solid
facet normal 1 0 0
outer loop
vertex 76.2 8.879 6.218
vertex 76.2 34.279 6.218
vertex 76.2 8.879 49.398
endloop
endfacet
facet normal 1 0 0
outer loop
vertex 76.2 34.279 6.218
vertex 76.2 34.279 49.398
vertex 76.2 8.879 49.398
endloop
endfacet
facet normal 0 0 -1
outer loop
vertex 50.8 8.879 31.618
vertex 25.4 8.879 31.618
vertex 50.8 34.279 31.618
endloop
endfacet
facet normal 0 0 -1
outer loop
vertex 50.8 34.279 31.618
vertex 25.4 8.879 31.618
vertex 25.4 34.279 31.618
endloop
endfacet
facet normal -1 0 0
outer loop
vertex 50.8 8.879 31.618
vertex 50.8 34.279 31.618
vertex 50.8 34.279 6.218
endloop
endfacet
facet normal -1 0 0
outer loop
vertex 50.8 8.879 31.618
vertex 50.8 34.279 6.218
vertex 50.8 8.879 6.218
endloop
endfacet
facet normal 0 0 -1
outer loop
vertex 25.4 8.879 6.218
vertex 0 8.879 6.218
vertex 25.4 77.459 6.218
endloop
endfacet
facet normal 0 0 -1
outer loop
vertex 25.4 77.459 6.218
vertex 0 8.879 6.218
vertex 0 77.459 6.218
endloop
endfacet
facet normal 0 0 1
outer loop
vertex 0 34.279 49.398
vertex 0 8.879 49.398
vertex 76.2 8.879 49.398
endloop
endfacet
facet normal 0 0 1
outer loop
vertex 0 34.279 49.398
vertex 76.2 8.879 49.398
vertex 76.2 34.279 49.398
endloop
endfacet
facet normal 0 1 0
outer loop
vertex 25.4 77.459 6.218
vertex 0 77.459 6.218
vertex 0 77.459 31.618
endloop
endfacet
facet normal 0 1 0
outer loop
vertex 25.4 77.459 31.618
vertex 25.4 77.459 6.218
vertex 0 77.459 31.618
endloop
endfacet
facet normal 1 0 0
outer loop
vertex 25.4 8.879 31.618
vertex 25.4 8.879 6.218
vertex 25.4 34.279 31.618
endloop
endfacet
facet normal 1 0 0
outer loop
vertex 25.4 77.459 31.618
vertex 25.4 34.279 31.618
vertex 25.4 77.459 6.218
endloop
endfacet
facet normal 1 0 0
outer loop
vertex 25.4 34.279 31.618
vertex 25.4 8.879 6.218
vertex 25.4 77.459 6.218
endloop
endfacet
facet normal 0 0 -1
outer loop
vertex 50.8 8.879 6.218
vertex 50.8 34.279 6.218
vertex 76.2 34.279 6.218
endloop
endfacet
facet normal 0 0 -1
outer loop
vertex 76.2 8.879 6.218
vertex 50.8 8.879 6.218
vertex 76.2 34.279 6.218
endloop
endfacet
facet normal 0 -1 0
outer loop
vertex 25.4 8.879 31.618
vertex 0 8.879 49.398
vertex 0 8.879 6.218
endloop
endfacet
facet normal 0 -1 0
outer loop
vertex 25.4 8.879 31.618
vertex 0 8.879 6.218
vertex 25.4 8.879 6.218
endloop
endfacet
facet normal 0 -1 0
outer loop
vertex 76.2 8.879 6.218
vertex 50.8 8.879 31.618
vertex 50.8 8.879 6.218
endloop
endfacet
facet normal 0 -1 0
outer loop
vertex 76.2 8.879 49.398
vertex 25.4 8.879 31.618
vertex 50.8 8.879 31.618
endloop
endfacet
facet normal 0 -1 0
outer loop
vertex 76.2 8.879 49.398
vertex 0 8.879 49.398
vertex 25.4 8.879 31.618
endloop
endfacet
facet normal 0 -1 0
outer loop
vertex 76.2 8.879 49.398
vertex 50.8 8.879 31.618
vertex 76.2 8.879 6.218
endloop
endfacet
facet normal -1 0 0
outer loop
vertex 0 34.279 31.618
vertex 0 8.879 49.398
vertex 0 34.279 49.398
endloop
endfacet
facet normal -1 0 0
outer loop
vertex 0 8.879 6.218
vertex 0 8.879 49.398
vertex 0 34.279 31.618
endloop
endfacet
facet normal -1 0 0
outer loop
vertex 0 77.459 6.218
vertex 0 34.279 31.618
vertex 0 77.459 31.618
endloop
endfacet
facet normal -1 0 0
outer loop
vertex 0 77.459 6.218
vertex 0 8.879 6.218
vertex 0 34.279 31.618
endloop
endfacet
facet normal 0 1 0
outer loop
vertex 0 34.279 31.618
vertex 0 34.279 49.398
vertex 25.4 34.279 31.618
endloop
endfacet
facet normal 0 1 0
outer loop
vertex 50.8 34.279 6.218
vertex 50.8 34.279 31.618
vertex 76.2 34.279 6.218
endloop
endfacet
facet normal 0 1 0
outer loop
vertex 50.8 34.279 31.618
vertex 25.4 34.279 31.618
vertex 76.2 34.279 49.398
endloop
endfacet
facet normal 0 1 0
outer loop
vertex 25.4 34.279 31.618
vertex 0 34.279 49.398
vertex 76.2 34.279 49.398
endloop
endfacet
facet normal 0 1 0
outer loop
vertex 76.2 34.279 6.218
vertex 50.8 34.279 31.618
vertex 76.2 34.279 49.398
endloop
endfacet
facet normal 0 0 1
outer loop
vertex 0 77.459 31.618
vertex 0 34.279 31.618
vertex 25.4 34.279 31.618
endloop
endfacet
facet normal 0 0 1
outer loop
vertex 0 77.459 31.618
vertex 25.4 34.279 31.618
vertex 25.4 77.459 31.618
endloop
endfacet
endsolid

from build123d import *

# Parameters (mm, degrees)
F0_W     = 68.58
F0_H     = 25.4
F1_DEPTH = 25.4
F2_W     = 25.4
F2_H     = 25.4
F3_DEPTH = 17.78
F4_W     = 25.4
F4_H     = 17.78
F5_DEPTH = 50.8
F6_W     = 25.4
F6_H     = 25.4
F7_DEPTH = 25.4


with BuildPart() as f1:
    # F0 (on Right) → F1 (new body)
    with BuildSketch(Plane.YZ):
        with Locations((43.169466, 18.918027)):
            Rectangle(F0_W, F0_H)
    extrude(amount=F1_DEPTH)

    # F2 (on face) → F3 (join)
    with BuildSketch(Plane.XY.offset(31.618027)):
        with Locations((12.7, 21.579466)):
            Rectangle(F2_W, F2_H)
    extrude(amount=F3_DEPTH)

    # F4 (on face) → F5 (join)
    with BuildSketch(Plane.YZ.offset(25.4)):
        with Locations((21.579466, 40.508027)):
            Rectangle(F4_W, F4_H)
    extrude(amount=F5_DEPTH)

    # F6 (on face) → F7 (join)
    with BuildSketch(Plane(origin=(0, 0, 31.618027), x_dir=(1, 0, 0), z_dir=(0, 0, -1))):
        with Locations((63.5, -21.579466)):
            Rectangle(F6_W, F6_H)
    extrude(amount=F7_DEPTH)


solid = f1.part
